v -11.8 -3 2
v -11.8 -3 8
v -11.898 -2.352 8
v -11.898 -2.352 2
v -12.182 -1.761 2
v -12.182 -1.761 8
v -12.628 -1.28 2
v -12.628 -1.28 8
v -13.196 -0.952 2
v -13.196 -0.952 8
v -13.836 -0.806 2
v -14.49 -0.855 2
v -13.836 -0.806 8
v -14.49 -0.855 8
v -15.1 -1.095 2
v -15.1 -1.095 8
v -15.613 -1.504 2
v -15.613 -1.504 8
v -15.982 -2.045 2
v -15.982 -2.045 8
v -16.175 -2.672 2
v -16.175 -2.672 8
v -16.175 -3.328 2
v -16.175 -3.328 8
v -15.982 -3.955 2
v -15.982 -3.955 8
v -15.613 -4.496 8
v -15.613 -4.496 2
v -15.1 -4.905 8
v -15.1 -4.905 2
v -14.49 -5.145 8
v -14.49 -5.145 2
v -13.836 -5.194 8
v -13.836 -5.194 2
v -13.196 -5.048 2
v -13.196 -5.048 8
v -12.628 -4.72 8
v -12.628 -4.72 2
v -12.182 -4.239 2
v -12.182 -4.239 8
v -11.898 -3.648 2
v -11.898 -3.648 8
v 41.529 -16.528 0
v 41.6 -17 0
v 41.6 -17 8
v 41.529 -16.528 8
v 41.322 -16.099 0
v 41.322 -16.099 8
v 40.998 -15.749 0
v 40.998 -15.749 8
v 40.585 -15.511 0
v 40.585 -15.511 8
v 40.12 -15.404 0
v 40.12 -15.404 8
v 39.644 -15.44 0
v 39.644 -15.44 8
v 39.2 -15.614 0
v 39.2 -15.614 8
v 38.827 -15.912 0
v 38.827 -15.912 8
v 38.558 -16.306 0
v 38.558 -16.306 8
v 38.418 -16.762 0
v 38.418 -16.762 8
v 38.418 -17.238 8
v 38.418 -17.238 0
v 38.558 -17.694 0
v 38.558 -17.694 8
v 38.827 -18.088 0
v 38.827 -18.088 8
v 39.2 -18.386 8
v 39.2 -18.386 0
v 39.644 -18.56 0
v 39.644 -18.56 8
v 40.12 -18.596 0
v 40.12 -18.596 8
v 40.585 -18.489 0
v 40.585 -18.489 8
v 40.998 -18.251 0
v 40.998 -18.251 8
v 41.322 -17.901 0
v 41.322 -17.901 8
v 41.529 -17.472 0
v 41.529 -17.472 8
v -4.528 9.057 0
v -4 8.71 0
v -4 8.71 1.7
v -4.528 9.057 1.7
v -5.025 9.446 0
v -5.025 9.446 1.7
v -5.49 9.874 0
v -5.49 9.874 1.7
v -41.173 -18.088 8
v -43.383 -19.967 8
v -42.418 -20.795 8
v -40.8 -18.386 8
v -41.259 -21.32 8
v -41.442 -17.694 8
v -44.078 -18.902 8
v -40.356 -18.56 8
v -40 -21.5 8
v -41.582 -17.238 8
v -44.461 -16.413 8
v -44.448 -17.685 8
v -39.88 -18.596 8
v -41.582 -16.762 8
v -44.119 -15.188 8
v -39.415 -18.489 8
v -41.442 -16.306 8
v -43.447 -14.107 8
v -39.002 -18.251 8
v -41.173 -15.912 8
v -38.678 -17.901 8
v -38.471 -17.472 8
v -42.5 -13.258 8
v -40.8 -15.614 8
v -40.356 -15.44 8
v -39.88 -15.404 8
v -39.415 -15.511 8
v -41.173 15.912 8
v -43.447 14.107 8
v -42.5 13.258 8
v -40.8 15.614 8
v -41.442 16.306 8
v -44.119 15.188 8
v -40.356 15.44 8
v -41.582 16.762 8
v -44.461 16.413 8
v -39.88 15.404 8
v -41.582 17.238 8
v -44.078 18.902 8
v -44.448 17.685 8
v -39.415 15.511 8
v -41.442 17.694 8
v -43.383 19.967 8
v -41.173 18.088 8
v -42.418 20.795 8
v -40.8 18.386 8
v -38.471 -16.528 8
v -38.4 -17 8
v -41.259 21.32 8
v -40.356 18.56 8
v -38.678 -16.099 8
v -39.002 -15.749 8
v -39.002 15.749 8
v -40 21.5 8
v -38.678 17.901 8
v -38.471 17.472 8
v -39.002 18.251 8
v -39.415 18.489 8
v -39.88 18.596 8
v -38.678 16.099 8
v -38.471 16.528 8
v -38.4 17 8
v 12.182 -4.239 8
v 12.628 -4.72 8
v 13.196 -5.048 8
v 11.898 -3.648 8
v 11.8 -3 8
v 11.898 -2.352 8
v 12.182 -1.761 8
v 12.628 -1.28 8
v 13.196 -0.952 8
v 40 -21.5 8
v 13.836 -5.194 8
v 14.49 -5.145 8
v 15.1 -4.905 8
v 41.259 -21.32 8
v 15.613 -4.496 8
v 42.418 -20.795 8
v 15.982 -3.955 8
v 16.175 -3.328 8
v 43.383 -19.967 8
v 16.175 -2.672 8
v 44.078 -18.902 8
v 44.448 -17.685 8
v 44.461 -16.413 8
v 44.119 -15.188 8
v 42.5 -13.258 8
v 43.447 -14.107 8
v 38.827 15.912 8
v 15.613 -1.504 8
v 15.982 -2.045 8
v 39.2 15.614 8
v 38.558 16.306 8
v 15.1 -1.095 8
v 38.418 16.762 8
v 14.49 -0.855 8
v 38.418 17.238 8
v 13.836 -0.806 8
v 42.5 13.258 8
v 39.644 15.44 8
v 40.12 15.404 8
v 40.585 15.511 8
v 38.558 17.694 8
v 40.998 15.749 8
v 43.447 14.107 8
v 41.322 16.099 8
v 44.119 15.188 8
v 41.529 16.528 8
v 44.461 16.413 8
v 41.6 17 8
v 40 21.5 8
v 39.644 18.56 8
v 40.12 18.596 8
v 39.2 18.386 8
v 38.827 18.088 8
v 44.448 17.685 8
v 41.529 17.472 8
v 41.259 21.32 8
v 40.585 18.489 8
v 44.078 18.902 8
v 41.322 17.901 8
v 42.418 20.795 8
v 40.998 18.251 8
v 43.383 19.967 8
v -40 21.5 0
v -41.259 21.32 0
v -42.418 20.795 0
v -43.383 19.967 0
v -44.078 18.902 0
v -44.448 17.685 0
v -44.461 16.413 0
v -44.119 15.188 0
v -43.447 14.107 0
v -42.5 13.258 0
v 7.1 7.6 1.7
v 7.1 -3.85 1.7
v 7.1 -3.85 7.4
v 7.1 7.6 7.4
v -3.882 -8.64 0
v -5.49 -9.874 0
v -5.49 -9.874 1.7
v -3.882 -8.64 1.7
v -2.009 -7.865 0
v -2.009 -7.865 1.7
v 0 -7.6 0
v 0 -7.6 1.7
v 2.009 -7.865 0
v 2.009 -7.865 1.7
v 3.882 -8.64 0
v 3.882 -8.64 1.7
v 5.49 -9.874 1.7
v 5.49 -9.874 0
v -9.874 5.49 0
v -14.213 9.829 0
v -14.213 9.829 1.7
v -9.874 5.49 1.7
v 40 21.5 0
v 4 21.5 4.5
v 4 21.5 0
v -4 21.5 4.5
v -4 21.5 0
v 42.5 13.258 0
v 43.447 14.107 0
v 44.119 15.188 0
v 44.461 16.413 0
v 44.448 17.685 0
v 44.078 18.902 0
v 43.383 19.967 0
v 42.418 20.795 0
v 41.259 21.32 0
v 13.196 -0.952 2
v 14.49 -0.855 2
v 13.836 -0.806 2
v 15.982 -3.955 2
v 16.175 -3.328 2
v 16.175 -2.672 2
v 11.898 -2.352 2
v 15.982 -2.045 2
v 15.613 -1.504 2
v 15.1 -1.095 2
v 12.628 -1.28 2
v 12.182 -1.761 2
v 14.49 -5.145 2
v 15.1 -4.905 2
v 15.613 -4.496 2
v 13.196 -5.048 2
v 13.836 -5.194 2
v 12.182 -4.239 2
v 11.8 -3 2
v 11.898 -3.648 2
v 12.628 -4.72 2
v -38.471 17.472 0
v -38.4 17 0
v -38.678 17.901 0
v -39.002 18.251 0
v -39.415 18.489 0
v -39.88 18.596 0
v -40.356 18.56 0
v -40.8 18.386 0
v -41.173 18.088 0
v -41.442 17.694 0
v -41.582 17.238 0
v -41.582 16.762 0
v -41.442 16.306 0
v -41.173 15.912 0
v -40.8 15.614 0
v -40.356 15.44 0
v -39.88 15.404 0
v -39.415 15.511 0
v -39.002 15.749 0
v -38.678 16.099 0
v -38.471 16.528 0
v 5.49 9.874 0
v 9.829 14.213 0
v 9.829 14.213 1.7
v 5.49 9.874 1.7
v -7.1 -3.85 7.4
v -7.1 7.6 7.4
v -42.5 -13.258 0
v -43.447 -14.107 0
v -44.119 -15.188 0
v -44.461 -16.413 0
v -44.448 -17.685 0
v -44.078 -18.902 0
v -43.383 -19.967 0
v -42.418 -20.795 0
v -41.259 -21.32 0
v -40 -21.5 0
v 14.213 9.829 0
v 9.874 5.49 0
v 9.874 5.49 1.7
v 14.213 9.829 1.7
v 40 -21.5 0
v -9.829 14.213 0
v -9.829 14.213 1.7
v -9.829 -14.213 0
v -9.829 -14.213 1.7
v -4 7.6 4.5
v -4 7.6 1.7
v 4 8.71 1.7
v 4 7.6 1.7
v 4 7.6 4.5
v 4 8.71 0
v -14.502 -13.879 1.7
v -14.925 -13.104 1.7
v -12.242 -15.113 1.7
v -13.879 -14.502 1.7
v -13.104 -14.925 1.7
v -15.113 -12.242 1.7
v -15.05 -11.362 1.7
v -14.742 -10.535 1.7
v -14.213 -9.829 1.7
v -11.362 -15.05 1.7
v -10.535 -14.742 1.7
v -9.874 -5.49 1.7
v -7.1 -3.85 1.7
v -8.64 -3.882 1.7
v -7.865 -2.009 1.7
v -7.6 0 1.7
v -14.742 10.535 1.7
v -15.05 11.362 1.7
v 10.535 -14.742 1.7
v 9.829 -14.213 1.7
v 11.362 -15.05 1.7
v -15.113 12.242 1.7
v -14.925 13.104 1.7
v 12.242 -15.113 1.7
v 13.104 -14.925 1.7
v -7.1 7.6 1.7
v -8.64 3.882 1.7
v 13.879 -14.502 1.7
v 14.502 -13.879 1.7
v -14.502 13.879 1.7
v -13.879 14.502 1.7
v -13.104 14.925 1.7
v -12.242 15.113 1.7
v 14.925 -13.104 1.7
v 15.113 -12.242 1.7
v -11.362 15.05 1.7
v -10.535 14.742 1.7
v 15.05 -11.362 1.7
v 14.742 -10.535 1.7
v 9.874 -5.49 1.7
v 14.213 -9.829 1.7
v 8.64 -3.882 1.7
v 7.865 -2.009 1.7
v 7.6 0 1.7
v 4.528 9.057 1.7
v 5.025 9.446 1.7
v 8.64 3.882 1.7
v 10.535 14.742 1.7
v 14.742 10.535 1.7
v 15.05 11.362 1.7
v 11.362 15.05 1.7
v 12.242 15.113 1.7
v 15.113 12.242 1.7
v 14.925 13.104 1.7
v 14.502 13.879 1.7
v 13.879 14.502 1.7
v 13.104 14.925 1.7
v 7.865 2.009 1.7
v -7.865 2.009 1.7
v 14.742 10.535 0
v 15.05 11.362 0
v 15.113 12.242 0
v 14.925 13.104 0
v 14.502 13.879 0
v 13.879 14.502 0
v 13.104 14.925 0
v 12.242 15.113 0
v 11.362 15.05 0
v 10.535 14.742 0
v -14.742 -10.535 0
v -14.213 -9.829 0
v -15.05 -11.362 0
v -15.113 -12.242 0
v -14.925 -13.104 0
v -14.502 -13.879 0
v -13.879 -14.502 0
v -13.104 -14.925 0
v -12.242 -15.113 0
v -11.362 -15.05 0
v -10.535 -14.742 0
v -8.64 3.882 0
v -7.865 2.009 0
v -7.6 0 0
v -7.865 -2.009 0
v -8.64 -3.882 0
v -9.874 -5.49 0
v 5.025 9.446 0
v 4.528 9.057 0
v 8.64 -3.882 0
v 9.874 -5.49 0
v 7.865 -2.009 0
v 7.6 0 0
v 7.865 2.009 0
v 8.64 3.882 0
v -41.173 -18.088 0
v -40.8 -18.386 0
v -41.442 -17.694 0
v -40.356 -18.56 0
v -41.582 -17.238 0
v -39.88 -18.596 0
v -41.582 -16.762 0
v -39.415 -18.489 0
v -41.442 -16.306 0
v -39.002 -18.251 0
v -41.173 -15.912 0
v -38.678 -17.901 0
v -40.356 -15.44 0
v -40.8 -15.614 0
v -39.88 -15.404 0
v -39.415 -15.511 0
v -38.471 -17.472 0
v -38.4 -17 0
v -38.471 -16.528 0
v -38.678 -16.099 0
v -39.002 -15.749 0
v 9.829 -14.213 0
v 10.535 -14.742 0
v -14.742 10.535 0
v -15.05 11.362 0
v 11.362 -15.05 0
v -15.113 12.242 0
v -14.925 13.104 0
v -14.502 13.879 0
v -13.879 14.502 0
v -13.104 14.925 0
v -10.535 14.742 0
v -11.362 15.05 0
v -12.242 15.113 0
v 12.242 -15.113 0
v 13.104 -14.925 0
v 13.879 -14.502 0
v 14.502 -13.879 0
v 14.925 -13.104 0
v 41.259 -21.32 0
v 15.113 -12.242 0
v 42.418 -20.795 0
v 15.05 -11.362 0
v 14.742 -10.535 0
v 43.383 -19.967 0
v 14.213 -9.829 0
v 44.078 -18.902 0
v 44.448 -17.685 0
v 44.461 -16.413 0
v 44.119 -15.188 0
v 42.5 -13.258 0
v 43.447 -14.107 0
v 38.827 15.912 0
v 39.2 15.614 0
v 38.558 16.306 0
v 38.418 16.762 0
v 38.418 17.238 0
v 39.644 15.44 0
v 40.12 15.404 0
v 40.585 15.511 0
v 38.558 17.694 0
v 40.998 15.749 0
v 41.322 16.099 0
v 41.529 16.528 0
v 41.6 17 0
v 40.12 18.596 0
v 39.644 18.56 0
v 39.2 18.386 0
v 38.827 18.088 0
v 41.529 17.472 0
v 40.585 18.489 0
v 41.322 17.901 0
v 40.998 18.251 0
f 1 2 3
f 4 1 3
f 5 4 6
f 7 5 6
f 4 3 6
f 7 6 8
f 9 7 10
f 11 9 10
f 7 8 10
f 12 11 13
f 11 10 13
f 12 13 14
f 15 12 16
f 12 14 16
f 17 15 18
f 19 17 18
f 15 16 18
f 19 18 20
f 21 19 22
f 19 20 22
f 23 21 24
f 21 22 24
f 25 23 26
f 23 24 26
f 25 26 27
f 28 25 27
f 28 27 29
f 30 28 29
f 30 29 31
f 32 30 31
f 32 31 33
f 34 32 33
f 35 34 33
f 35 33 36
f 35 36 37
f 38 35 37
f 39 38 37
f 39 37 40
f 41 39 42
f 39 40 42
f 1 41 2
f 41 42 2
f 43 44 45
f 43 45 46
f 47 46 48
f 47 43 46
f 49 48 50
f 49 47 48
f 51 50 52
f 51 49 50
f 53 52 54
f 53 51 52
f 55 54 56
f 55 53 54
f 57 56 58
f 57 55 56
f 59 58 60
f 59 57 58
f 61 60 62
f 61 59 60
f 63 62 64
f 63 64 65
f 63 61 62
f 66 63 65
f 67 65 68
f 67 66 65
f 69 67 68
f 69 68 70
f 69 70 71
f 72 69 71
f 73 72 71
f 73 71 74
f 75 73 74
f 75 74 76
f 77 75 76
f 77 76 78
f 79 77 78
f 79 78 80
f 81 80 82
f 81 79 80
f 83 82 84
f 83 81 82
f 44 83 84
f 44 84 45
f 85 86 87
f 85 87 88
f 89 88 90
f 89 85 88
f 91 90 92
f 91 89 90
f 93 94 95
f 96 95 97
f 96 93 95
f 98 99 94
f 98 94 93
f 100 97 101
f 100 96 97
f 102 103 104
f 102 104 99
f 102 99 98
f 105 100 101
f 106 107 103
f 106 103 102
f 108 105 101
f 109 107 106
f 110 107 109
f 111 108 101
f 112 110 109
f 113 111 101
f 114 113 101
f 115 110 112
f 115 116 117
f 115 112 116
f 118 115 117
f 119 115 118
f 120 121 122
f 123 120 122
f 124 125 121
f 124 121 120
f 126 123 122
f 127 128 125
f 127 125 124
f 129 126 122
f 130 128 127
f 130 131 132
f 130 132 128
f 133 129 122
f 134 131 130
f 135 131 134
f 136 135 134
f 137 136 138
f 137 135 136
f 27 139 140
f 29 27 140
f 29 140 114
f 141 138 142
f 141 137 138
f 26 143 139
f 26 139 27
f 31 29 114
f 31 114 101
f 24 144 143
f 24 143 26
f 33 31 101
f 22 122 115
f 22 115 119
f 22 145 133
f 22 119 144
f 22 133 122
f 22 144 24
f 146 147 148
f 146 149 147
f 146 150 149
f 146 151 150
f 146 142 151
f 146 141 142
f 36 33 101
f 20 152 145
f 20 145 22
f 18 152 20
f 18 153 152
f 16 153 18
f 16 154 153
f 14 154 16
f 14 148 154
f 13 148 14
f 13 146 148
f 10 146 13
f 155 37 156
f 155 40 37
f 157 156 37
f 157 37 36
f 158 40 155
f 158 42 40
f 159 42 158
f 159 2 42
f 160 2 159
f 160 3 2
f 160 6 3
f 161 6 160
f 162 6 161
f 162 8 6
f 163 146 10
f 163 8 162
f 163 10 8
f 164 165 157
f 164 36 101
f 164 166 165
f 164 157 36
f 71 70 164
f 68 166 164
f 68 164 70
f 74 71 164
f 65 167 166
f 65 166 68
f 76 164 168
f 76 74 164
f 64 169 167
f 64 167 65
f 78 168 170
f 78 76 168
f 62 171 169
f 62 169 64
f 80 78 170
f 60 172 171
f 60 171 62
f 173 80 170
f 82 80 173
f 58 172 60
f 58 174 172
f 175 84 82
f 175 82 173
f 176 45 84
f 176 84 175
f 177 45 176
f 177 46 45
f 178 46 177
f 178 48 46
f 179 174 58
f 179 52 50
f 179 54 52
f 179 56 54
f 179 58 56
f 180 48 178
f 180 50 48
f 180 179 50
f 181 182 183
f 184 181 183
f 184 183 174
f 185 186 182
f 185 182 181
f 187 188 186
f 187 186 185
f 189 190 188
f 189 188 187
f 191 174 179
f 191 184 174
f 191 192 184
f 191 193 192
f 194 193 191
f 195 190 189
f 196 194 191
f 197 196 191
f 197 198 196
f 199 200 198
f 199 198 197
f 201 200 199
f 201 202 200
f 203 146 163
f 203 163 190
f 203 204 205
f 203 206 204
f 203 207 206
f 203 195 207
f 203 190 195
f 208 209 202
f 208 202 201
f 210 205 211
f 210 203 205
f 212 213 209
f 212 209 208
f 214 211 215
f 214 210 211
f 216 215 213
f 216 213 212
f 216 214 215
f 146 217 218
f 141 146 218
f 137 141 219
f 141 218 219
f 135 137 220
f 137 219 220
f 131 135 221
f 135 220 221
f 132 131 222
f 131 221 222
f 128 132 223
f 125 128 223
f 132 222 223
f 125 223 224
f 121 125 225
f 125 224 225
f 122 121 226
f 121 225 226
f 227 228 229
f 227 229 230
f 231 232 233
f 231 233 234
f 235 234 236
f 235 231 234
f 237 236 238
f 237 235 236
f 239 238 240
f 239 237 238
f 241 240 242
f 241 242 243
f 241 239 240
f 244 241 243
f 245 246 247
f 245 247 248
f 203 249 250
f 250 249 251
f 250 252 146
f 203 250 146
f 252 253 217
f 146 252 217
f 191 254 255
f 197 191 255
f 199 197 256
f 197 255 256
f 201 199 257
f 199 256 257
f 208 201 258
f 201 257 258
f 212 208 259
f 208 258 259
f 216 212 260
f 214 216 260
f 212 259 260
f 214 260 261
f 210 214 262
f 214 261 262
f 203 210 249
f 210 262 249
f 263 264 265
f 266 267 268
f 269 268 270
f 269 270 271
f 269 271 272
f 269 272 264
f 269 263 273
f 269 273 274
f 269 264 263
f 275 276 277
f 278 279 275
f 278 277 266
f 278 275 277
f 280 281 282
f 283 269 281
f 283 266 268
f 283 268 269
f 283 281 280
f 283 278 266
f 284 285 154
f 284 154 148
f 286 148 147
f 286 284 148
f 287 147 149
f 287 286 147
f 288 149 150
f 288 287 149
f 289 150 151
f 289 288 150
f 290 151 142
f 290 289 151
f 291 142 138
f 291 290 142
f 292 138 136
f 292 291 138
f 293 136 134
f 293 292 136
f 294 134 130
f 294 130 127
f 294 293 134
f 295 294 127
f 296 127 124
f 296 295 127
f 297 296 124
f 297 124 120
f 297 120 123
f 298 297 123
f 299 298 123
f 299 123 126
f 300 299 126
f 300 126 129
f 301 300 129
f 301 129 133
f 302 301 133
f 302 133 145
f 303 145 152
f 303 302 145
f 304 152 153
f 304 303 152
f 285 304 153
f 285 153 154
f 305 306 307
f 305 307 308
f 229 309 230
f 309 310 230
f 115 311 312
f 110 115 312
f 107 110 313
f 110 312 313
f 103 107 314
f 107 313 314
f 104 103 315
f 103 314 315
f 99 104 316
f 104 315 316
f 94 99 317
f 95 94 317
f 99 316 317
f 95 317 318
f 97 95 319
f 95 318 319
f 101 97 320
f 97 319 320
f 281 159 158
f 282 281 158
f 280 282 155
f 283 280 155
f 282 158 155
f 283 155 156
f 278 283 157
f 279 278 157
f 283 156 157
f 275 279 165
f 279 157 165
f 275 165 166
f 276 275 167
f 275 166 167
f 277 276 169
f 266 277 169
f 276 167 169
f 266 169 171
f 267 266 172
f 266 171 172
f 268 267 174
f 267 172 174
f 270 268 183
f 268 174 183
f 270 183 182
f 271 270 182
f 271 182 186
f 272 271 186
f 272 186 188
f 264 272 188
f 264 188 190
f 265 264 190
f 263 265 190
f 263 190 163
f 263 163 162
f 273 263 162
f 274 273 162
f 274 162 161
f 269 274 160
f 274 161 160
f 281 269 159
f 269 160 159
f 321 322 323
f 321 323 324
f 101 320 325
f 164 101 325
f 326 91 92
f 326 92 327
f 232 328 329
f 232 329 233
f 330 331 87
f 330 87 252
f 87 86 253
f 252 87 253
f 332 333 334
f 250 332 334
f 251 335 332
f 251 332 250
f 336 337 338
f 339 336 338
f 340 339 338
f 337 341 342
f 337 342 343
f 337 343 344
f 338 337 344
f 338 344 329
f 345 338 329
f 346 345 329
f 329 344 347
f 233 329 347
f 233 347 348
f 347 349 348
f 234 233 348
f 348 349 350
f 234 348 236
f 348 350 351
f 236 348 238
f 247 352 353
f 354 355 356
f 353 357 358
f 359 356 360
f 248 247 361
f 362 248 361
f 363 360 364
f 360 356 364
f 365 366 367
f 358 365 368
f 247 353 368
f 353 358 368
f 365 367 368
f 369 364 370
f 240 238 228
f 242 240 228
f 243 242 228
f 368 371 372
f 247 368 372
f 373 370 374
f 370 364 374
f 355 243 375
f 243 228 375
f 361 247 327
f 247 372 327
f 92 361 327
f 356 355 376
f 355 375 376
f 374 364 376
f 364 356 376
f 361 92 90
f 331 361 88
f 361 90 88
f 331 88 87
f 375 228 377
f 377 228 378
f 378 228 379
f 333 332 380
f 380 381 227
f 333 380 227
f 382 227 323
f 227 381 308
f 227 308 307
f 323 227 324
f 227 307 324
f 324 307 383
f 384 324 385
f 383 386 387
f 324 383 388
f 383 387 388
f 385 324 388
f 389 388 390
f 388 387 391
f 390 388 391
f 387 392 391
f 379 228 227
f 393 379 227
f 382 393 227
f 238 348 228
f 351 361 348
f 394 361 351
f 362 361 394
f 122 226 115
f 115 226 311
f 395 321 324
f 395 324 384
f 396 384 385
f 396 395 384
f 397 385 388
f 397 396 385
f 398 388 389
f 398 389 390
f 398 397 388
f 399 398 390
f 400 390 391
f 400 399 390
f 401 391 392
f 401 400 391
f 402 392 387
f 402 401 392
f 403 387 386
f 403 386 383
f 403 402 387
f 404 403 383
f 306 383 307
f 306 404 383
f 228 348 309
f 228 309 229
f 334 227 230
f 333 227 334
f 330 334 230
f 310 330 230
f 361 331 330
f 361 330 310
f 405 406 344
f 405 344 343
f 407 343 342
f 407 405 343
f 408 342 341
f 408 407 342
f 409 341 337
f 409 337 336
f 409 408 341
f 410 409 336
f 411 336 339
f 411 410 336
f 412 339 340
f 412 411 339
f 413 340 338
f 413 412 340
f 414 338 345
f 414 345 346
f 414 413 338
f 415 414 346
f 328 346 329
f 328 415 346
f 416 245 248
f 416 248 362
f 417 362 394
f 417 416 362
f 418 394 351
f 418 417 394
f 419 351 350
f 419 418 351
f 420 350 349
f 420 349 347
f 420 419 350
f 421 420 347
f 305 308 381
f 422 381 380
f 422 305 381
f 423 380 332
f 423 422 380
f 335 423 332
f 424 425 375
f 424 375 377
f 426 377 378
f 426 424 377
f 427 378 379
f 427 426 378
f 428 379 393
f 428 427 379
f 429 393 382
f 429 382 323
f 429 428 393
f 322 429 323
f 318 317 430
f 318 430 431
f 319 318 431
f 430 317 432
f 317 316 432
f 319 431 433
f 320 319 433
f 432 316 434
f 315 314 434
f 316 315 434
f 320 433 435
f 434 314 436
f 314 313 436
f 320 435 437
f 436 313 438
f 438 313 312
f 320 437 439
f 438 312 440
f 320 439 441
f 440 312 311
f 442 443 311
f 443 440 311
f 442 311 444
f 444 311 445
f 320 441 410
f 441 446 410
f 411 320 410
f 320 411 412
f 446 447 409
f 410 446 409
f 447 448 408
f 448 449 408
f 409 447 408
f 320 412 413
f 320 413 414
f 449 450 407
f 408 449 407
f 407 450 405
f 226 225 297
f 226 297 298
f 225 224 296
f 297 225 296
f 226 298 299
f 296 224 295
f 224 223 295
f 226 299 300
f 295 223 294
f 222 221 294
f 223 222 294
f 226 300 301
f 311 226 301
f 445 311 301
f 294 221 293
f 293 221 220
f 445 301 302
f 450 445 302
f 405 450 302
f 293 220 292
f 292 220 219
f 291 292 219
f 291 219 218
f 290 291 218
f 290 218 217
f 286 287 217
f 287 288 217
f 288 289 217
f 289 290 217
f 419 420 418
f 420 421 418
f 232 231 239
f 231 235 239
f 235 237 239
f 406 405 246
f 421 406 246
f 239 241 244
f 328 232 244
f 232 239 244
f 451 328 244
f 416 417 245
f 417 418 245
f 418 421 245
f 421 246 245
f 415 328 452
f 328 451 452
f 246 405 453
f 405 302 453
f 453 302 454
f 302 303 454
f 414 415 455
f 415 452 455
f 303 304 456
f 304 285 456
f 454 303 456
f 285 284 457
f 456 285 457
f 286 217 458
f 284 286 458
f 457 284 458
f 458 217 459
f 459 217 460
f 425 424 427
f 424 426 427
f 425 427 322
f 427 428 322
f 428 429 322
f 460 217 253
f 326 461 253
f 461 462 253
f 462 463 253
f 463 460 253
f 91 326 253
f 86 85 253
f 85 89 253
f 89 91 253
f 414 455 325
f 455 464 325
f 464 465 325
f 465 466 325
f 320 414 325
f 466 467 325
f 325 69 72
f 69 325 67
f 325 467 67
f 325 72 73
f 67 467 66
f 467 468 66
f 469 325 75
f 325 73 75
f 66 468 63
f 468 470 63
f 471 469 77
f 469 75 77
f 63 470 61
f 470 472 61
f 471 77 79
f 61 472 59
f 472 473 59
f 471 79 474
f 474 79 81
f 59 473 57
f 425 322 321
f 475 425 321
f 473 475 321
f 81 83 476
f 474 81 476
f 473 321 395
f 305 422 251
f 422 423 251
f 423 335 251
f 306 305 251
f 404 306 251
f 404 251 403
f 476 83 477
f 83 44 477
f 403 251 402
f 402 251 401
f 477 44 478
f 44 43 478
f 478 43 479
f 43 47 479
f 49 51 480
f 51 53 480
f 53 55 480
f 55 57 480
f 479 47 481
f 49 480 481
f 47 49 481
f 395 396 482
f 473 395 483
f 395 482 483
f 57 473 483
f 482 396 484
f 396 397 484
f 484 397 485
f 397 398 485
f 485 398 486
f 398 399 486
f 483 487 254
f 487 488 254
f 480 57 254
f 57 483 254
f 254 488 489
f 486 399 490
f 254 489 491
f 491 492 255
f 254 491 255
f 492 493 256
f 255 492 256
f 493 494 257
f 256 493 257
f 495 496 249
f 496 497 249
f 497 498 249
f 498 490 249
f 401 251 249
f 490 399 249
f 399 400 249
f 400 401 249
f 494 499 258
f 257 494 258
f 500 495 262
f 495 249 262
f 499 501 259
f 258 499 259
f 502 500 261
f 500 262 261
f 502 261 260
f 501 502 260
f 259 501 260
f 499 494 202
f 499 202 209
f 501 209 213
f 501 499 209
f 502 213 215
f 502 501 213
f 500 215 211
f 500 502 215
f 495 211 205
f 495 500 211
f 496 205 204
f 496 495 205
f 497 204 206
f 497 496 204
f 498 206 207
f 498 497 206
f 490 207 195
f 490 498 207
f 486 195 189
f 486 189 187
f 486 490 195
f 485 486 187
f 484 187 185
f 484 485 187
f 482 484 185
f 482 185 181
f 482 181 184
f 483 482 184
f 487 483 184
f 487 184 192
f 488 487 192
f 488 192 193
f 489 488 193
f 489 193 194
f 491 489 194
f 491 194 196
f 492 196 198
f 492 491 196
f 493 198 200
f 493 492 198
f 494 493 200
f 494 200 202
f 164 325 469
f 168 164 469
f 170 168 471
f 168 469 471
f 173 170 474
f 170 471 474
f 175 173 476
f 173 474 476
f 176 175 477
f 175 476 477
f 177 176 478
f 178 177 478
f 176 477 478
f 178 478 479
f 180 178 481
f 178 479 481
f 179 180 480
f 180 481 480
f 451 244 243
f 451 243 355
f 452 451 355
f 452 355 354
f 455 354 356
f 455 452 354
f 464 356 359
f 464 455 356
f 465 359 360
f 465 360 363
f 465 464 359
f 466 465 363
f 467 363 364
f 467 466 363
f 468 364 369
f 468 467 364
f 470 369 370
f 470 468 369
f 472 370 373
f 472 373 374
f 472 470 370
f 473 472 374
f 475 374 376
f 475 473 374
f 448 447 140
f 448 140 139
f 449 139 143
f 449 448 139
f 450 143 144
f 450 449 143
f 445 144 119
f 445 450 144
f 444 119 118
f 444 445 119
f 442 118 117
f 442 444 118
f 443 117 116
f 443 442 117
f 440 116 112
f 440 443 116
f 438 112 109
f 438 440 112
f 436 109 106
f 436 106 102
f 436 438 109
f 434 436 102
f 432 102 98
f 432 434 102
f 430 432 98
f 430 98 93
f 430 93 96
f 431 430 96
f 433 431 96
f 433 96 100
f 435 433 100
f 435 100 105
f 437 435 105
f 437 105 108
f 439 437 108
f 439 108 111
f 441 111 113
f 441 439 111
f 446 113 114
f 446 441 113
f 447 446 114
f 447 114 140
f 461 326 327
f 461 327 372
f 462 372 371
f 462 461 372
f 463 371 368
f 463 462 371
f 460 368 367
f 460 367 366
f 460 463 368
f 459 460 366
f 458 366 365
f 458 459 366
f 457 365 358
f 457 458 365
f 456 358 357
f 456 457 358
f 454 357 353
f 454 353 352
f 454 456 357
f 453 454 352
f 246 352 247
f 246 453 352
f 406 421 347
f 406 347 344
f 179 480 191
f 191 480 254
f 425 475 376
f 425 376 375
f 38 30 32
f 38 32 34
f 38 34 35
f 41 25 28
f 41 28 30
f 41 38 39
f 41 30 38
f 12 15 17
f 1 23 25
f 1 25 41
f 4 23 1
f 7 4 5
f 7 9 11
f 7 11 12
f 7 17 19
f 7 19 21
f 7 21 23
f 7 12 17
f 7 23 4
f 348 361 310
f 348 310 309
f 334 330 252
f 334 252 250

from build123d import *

# Parameters (mm, degrees)
SKETCH1_R           = 1.6
BOSS_EXTRUDE1_DEPTH = 8
CUT_EXTRUDE4_DEPTH  = 1.7
CUT_EXTRUDE5_DEPTH  = 7.4
SKETCH1_9_W         = 8
SKETCH1_9_H         = 13.9
CUT_EXTRUDE6_DEPTH  = 4.5
SKETCH2_R           = 2.2
CUT_EXTRUDE11_DEPTH = 6


with BuildPart() as part:
    # Sketch1 → Boss-Extrude1 (new body)
    with BuildSketch(Plane.XY):
        with BuildLine():
            Line((-42.5, 13.258342613), (-42.5, -13.258342613))
            ThreePointArc((-42.5, -13.258342613), (-44.30624304, -18.30624304), (-40, -21.5))
            Line((-40, -21.5), (40, -21.5))
            ThreePointArc((40, -21.5), (44.30624304, -18.30624304), (42.5, -13.258342613))
            Line((42.5, -13.258342613), (42.5, 13.258342613))
            ThreePointArc((42.5, 13.258342613), (44.30624304, 18.30624304), (40, 21.5))
            Line((40, 21.5), (-40, 21.5))
            ThreePointArc((-40, 21.5), (-44.30624304, 18.30624304), (-42.5, 13.258342613))
        make_face()
        with Locations((-40, -17)):
            Circle(SKETCH1_R, mode=Mode.SUBTRACT)
        with Locations((40, -17)):
            Circle(SKETCH1_R, mode=Mode.SUBTRACT)
        with Locations((-40, 17)):
            Circle(SKETCH1_R, mode=Mode.SUBTRACT)
        with Locations((40, 17)):
            Circle(SKETCH1_R, mode=Mode.SUBTRACT)
    extrude(amount=BOSS_EXTRUDE1_DEPTH)

    # Sketch1<7> → Cut-Extrude4 (cut)
    with BuildSketch(Plane.XY):
        with BuildLine():
            Line((-5.489949494, 9.874011537), (-9.828784258, 14.212846302))
            ThreePointArc((-9.828784258, 14.212846302), (-14.212846302, 14.212846302), (-14.212846302, 9.828784258))
            Line((-14.212846302, 9.828784258), (-9.874011537, 5.489949494))
            ThreePointArc((-9.874011537, 5.489949494), (-7.6, 0), (-9.874011537, -5.489949494))
            Line((-9.874011537, -5.489949494), (-14.212846302, -9.828784258))
            ThreePointArc((-14.212846302, -9.828784258), (-14.212846302, -14.212846302), (-9.828784258, -14.212846302))
            Line((-9.828784258, -14.212846302), (-5.489949494, -9.874011537))
            ThreePointArc((-5.489949494, -9.874011537), (0, -7.6), (5.489949494, -9.874011537))
            Line((5.489949494, -9.874011537), (9.828784258, -14.212846302))
            ThreePointArc((9.828784258, -14.212846302), (14.212846302, -14.212846302), (14.212846302, -9.828784258))
            Line((14.212846302, -9.828784258), (9.874011537, -5.489949494))
            ThreePointArc((9.874011537, -5.489949494), (7.6, 0), (9.874011537, 5.489949494))
            Line((9.874011537, 5.489949494), (14.212846302, 9.828784258))
            ThreePointArc((14.212846302, 9.828784258), (14.212846302, 14.212846302), (9.828784258, 14.212846302))
            Line((9.828784258, 14.212846302), (5.489949494, 9.874011537))
            ThreePointArc((5.489949494, 9.874011537), (0, 7.6), (-5.489949494, 9.874011537))
        make_face()
    extrude(amount=CUT_EXTRUDE4_DEPTH, mode=Mode.SUBTRACT)

    # Sketch1<8> → Cut-Extrude5 (cut)
    with BuildSketch(Plane.XY):
        Polygon((-7.1, -3.85), (7.1, -3.85), (7.1, 3.85), (7.1, 7.6), (-7.1, 7.6), (-7.1, 3.85), align=None)
    extrude(amount=CUT_EXTRUDE5_DEPTH, mode=Mode.SUBTRACT)

    # Sketch1<9> → Cut-Extrude6 (cut)
    with BuildSketch(Plane.XY):
        with Locations((0, 14.55)):
            Rectangle(SKETCH1_9_W, SKETCH1_9_H)
    extrude(amount=CUT_EXTRUDE6_DEPTH, mode=Mode.SUBTRACT)

    # Sketch2 → Cut-Extrude11 (cut)
    with BuildSketch(Plane.XY.offset(8)):
        with Locations((-14, -3)):
            Circle(SKETCH2_R)
        with Locations((14, -3)):
            Circle(SKETCH2_R)
    extrude(amount=-CUT_EXTRUDE11_DEPTH, mode=Mode.SUBTRACT)


solid = part.part
